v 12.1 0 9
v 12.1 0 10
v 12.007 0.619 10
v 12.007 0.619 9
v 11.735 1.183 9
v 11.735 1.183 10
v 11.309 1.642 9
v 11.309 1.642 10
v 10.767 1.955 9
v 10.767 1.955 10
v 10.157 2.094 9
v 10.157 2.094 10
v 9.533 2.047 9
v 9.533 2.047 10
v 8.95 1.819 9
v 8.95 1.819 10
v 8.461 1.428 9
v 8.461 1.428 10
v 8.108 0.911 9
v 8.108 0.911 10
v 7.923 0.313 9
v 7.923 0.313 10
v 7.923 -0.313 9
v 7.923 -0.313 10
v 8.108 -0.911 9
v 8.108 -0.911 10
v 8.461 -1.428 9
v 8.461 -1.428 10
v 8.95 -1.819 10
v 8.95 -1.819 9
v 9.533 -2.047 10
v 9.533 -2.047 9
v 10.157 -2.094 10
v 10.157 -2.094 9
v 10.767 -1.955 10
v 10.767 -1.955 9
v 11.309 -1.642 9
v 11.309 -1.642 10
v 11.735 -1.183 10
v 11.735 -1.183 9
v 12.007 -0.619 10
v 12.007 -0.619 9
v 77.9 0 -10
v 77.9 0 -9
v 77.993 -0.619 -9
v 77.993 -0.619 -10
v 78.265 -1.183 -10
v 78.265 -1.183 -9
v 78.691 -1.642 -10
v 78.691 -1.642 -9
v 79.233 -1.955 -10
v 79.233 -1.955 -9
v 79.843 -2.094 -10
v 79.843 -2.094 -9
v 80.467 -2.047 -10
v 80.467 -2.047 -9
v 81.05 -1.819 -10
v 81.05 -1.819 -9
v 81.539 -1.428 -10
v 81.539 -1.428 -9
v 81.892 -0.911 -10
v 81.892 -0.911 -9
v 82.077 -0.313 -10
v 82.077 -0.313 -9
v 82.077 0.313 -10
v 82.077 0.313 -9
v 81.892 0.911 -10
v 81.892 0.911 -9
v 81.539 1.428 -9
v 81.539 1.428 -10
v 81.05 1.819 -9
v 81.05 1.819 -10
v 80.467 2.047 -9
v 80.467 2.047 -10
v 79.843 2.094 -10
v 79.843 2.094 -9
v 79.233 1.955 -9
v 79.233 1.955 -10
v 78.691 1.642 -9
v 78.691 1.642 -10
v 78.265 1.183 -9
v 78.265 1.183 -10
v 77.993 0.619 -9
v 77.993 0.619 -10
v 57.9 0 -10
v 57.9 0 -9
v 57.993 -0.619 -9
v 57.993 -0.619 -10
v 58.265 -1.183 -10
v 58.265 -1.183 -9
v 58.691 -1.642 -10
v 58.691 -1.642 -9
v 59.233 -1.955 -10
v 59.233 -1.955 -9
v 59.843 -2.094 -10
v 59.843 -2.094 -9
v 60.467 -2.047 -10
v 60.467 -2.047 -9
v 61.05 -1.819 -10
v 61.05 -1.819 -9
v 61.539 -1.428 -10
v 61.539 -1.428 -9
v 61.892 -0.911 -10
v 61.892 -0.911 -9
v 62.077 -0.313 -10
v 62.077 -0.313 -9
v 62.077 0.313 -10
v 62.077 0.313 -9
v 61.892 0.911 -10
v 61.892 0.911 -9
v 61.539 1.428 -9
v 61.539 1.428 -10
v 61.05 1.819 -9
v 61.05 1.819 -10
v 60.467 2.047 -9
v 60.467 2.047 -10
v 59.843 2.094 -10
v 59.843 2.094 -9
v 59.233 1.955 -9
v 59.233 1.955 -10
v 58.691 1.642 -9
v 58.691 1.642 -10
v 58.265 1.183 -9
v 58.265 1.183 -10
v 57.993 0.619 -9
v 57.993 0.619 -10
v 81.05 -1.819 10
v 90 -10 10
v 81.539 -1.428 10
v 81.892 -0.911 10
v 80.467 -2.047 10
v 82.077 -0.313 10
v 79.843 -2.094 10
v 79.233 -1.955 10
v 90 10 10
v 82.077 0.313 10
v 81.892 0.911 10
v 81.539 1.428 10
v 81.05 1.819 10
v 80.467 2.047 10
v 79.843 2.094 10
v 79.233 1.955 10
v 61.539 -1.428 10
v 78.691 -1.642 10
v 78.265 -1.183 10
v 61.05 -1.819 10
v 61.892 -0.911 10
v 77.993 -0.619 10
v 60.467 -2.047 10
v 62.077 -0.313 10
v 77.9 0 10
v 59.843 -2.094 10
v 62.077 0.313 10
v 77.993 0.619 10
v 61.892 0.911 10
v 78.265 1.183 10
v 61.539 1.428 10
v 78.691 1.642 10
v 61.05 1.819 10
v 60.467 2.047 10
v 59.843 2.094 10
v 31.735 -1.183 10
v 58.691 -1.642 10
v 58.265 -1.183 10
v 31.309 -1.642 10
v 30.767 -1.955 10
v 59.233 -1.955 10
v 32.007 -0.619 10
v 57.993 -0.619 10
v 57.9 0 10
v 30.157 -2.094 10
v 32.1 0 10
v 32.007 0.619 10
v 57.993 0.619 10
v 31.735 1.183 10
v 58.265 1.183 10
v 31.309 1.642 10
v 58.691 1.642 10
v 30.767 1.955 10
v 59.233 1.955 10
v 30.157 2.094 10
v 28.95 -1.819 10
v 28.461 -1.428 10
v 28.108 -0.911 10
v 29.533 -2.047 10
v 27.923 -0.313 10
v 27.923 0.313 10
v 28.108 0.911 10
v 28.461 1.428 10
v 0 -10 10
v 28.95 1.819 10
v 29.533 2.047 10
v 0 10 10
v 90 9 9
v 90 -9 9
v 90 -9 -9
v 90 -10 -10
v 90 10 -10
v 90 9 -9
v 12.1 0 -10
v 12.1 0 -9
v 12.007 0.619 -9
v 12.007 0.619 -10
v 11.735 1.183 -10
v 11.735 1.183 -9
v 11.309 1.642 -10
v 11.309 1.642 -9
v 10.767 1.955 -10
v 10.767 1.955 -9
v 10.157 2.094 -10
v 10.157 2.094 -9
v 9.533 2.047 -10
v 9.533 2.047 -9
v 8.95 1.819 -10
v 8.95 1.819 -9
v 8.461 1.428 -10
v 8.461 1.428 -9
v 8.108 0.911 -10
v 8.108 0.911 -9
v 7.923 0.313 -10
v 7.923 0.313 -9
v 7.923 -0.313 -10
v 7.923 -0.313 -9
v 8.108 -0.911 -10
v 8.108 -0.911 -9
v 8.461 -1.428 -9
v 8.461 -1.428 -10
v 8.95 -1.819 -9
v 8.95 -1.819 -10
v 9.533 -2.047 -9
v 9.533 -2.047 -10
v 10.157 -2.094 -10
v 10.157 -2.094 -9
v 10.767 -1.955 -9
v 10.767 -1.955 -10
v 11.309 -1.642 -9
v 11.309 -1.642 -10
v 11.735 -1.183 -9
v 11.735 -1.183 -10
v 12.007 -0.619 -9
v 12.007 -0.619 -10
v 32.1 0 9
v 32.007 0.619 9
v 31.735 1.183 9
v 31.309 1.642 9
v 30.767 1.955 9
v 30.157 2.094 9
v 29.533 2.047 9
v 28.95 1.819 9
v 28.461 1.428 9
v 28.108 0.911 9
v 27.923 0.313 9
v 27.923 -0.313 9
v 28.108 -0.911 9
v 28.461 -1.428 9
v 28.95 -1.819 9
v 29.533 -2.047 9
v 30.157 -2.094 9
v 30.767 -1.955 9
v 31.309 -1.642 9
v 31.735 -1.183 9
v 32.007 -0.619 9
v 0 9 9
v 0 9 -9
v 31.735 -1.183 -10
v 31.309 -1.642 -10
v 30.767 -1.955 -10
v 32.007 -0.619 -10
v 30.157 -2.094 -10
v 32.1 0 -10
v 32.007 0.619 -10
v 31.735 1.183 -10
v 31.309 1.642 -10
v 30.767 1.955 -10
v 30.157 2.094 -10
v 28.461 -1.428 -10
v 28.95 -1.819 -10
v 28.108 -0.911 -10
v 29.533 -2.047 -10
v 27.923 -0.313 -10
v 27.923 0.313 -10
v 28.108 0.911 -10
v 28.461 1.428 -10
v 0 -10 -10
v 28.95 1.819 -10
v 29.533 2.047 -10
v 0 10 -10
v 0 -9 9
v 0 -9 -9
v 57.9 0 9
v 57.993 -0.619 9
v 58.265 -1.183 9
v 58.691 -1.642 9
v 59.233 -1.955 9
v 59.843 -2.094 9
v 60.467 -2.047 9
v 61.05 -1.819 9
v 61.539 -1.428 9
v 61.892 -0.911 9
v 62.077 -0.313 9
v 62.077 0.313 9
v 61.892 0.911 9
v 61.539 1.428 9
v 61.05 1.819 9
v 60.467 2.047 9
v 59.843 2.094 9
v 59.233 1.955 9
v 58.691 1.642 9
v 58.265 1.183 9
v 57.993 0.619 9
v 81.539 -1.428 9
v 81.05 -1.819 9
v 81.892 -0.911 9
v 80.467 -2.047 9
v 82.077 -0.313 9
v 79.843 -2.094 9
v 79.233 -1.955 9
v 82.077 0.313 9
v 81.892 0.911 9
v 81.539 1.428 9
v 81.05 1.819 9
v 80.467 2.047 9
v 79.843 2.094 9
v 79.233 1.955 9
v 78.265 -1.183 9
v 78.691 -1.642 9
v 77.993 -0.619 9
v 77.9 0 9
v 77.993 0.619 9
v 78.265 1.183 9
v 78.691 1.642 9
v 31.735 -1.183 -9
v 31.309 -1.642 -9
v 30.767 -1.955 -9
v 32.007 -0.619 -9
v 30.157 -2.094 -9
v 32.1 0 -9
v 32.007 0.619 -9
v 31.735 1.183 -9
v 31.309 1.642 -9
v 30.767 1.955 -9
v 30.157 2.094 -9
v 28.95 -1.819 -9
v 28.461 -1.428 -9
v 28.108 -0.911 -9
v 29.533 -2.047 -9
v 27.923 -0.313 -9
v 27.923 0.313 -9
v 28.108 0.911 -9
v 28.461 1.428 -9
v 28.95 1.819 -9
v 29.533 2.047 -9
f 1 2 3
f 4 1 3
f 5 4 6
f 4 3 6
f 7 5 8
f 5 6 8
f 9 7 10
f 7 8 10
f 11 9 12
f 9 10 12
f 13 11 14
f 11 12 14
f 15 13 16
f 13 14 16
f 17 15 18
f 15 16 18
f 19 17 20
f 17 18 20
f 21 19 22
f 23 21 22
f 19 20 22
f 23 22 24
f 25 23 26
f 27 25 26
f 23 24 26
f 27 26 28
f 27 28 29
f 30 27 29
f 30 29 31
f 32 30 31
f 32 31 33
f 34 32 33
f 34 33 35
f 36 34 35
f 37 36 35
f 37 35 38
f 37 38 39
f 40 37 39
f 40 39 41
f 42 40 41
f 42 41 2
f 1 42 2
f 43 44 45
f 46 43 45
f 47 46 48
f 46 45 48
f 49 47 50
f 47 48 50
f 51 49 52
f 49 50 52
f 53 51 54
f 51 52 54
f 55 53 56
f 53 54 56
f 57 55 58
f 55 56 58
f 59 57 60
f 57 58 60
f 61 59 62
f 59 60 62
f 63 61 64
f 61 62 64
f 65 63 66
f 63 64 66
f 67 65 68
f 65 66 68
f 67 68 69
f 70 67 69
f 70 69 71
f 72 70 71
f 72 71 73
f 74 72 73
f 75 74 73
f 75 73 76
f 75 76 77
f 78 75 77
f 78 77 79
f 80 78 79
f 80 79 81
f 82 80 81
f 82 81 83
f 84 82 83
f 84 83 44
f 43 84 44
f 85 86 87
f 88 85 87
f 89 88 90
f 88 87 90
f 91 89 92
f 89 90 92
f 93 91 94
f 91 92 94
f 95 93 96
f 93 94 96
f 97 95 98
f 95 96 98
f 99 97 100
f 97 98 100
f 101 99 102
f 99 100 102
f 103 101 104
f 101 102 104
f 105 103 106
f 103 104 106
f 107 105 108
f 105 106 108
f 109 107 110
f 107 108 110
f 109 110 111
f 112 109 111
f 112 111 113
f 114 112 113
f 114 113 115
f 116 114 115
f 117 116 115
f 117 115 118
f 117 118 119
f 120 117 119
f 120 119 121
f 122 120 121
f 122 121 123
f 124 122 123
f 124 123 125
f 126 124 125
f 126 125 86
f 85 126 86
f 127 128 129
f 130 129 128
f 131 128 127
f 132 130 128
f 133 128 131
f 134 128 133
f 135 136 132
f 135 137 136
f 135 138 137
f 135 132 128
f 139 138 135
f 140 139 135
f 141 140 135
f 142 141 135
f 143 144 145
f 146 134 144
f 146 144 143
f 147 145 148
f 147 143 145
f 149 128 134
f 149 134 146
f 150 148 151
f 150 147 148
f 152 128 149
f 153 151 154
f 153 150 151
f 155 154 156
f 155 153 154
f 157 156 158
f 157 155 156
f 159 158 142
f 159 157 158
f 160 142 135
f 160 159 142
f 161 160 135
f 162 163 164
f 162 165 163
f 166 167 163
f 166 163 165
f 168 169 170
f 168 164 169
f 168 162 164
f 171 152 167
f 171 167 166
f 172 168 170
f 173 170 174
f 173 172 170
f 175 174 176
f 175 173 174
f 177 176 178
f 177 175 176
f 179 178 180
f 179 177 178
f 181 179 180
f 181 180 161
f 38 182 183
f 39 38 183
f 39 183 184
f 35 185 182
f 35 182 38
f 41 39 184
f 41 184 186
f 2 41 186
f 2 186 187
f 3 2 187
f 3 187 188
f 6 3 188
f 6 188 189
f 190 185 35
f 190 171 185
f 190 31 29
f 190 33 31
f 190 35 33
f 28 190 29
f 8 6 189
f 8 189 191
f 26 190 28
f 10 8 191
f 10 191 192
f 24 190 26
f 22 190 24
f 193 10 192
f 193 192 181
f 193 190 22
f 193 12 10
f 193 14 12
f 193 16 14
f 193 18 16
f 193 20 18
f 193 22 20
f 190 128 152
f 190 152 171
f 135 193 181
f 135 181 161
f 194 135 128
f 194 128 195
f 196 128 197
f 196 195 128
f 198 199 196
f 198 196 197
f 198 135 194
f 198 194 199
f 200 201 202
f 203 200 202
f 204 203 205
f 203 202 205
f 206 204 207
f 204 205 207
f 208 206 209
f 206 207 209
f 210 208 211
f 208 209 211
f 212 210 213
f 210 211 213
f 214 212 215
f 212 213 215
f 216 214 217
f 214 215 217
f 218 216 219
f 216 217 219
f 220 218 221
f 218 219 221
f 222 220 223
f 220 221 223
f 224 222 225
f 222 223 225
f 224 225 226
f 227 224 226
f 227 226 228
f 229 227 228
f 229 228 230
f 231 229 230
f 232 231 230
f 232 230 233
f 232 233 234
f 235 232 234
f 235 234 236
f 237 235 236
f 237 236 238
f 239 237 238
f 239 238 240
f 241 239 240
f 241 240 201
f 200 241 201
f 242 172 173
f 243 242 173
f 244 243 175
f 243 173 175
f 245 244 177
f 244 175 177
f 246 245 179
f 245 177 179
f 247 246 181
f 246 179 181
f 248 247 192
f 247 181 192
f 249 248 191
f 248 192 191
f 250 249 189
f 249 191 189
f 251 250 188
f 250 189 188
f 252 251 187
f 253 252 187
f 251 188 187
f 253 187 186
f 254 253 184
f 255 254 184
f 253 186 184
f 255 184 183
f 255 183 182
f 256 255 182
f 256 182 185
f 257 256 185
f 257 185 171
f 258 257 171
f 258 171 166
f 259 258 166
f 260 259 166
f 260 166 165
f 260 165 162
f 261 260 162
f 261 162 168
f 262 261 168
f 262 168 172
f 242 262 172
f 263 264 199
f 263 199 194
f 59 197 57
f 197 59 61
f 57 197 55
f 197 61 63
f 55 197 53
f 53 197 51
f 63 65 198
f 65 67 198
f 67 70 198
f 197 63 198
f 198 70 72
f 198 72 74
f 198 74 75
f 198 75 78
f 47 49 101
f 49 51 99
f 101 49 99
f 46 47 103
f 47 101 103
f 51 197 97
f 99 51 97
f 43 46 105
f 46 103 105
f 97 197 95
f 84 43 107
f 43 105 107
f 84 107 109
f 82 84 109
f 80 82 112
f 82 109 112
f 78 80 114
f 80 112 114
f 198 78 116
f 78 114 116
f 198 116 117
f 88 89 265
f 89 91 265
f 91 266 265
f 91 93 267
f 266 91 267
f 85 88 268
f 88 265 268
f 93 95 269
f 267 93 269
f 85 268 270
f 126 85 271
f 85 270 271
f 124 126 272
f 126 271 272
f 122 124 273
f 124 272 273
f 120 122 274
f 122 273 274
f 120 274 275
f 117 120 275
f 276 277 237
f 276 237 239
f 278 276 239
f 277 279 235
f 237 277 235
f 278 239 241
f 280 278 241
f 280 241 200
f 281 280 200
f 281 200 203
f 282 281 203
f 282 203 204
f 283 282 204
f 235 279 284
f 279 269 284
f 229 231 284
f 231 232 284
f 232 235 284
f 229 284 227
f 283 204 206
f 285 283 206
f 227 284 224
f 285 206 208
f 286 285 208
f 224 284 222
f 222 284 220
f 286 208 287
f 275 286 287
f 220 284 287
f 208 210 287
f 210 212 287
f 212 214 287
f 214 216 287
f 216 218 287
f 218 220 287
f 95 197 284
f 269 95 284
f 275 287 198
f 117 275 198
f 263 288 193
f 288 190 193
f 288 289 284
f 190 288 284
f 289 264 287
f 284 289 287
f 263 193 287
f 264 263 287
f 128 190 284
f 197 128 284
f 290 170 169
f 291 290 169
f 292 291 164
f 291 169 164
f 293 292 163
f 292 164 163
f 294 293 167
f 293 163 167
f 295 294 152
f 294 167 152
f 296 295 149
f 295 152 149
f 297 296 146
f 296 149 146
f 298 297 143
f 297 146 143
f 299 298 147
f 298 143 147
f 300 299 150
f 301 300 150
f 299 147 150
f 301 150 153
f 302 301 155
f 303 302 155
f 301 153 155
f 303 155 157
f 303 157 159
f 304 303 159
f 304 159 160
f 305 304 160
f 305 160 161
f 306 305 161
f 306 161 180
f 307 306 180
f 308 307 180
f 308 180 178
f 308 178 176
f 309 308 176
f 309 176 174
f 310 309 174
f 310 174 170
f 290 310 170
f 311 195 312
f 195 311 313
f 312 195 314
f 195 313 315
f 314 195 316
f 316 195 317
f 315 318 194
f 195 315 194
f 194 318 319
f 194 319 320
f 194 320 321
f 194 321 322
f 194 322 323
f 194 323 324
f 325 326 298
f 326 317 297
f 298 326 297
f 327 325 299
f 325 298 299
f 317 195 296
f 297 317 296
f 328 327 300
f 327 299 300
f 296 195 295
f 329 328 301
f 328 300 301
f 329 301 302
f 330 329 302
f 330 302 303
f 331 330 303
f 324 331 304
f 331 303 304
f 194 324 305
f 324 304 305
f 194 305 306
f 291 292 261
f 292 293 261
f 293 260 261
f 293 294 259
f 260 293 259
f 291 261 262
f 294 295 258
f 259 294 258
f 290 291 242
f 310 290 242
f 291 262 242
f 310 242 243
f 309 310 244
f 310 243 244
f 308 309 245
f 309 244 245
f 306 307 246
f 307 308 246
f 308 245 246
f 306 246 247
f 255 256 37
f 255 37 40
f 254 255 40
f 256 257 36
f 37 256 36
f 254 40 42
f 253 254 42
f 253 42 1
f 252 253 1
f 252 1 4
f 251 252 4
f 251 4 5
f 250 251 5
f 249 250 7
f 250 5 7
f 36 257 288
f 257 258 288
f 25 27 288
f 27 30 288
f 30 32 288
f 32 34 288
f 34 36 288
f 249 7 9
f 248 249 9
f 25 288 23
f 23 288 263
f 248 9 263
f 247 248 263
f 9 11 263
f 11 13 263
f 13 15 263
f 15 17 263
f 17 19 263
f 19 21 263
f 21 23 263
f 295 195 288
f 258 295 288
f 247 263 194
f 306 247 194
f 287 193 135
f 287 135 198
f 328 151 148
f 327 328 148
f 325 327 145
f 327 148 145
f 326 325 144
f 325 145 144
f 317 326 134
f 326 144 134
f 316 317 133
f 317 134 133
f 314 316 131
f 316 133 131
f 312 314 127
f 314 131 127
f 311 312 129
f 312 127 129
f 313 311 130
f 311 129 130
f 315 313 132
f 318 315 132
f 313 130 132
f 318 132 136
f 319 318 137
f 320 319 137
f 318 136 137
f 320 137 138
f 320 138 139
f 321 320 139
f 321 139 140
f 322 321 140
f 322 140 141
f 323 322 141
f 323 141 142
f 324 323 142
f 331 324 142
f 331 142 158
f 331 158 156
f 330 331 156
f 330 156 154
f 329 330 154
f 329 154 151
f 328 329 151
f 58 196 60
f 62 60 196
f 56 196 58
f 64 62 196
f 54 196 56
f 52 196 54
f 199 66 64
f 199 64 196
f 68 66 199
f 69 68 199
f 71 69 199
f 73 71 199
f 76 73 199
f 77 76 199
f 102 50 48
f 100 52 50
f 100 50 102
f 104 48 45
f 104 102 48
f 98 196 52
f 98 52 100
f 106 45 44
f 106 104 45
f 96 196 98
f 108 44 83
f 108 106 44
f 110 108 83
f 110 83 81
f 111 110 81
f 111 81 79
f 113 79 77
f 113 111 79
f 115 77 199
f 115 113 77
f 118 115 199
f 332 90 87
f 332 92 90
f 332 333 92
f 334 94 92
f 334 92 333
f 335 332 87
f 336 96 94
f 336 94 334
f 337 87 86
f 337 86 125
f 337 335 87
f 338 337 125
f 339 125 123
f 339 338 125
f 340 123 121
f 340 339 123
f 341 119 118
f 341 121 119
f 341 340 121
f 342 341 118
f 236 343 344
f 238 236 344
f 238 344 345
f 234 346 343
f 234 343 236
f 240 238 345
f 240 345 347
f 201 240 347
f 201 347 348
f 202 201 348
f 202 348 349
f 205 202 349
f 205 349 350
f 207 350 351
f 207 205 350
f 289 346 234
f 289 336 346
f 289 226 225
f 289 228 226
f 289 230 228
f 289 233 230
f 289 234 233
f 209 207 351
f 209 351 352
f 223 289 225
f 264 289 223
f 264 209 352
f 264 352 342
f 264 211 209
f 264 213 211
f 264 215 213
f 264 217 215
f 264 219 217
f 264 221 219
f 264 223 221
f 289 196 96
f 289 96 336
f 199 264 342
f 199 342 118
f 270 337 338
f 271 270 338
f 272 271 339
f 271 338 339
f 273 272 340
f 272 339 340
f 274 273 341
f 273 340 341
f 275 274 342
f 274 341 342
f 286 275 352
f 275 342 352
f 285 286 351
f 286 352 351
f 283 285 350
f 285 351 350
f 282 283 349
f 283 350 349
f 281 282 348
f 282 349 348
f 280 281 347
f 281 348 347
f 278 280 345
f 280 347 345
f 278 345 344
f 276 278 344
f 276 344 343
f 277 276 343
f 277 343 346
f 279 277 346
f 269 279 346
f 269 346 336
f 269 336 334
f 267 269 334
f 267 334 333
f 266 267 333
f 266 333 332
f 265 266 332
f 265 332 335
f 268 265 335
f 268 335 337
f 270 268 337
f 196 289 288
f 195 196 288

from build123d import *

# Parameters (mm, degrees)
SKETCH_1_W          = 20
SKETCH_1_H          = 20
EXTRUDE_1_DEPTH     = 90
SKETCH_2_R          = 2.1
CUT_EXTRUDE_1_DEPTH = 93.736184955
SKETCH_3_W          = 18
SKETCH_3_H          = 18
CUT_EXTRUDE_2_DEPTH = 92.104335791


with BuildPart() as part:
    # 草图1 → 凸台-拉伸1 (new body)
    with BuildSketch(Plane(origin=(0, 0, 0), x_dir=(0, 0, -1), z_dir=(1, 0, 0))):
        Rectangle(SKETCH_1_W, SKETCH_1_H)
    extrude(amount=EXTRUDE_1_DEPTH)

    # 草图2 → 切除-拉伸1 (cut, through all)
    with BuildSketch(Plane.XY.offset(10)):
        with Locations((10, 0)):
            Circle(SKETCH_2_R)
        with Locations((30, 0)):
            Circle(SKETCH_2_R)
        with Locations(Location((60, 0, 0), (0, 0, 180))):
            Circle(SKETCH_2_R)
        with Locations(Location((80, 0, 0), (0, 0, 180))):
            Circle(SKETCH_2_R)
    extrude(amount=-CUT_EXTRUDE_1_DEPTH, mode=Mode.SUBTRACT)

    # 草图3 → 切除-拉伸2 (cut, through all)
    with BuildSketch(Plane.ZY):
        Rectangle(SKETCH_3_W, SKETCH_3_H)
    extrude(amount=-CUT_EXTRUDE_2_DEPTH, mode=Mode.SUBTRACT)


solid = part.part
